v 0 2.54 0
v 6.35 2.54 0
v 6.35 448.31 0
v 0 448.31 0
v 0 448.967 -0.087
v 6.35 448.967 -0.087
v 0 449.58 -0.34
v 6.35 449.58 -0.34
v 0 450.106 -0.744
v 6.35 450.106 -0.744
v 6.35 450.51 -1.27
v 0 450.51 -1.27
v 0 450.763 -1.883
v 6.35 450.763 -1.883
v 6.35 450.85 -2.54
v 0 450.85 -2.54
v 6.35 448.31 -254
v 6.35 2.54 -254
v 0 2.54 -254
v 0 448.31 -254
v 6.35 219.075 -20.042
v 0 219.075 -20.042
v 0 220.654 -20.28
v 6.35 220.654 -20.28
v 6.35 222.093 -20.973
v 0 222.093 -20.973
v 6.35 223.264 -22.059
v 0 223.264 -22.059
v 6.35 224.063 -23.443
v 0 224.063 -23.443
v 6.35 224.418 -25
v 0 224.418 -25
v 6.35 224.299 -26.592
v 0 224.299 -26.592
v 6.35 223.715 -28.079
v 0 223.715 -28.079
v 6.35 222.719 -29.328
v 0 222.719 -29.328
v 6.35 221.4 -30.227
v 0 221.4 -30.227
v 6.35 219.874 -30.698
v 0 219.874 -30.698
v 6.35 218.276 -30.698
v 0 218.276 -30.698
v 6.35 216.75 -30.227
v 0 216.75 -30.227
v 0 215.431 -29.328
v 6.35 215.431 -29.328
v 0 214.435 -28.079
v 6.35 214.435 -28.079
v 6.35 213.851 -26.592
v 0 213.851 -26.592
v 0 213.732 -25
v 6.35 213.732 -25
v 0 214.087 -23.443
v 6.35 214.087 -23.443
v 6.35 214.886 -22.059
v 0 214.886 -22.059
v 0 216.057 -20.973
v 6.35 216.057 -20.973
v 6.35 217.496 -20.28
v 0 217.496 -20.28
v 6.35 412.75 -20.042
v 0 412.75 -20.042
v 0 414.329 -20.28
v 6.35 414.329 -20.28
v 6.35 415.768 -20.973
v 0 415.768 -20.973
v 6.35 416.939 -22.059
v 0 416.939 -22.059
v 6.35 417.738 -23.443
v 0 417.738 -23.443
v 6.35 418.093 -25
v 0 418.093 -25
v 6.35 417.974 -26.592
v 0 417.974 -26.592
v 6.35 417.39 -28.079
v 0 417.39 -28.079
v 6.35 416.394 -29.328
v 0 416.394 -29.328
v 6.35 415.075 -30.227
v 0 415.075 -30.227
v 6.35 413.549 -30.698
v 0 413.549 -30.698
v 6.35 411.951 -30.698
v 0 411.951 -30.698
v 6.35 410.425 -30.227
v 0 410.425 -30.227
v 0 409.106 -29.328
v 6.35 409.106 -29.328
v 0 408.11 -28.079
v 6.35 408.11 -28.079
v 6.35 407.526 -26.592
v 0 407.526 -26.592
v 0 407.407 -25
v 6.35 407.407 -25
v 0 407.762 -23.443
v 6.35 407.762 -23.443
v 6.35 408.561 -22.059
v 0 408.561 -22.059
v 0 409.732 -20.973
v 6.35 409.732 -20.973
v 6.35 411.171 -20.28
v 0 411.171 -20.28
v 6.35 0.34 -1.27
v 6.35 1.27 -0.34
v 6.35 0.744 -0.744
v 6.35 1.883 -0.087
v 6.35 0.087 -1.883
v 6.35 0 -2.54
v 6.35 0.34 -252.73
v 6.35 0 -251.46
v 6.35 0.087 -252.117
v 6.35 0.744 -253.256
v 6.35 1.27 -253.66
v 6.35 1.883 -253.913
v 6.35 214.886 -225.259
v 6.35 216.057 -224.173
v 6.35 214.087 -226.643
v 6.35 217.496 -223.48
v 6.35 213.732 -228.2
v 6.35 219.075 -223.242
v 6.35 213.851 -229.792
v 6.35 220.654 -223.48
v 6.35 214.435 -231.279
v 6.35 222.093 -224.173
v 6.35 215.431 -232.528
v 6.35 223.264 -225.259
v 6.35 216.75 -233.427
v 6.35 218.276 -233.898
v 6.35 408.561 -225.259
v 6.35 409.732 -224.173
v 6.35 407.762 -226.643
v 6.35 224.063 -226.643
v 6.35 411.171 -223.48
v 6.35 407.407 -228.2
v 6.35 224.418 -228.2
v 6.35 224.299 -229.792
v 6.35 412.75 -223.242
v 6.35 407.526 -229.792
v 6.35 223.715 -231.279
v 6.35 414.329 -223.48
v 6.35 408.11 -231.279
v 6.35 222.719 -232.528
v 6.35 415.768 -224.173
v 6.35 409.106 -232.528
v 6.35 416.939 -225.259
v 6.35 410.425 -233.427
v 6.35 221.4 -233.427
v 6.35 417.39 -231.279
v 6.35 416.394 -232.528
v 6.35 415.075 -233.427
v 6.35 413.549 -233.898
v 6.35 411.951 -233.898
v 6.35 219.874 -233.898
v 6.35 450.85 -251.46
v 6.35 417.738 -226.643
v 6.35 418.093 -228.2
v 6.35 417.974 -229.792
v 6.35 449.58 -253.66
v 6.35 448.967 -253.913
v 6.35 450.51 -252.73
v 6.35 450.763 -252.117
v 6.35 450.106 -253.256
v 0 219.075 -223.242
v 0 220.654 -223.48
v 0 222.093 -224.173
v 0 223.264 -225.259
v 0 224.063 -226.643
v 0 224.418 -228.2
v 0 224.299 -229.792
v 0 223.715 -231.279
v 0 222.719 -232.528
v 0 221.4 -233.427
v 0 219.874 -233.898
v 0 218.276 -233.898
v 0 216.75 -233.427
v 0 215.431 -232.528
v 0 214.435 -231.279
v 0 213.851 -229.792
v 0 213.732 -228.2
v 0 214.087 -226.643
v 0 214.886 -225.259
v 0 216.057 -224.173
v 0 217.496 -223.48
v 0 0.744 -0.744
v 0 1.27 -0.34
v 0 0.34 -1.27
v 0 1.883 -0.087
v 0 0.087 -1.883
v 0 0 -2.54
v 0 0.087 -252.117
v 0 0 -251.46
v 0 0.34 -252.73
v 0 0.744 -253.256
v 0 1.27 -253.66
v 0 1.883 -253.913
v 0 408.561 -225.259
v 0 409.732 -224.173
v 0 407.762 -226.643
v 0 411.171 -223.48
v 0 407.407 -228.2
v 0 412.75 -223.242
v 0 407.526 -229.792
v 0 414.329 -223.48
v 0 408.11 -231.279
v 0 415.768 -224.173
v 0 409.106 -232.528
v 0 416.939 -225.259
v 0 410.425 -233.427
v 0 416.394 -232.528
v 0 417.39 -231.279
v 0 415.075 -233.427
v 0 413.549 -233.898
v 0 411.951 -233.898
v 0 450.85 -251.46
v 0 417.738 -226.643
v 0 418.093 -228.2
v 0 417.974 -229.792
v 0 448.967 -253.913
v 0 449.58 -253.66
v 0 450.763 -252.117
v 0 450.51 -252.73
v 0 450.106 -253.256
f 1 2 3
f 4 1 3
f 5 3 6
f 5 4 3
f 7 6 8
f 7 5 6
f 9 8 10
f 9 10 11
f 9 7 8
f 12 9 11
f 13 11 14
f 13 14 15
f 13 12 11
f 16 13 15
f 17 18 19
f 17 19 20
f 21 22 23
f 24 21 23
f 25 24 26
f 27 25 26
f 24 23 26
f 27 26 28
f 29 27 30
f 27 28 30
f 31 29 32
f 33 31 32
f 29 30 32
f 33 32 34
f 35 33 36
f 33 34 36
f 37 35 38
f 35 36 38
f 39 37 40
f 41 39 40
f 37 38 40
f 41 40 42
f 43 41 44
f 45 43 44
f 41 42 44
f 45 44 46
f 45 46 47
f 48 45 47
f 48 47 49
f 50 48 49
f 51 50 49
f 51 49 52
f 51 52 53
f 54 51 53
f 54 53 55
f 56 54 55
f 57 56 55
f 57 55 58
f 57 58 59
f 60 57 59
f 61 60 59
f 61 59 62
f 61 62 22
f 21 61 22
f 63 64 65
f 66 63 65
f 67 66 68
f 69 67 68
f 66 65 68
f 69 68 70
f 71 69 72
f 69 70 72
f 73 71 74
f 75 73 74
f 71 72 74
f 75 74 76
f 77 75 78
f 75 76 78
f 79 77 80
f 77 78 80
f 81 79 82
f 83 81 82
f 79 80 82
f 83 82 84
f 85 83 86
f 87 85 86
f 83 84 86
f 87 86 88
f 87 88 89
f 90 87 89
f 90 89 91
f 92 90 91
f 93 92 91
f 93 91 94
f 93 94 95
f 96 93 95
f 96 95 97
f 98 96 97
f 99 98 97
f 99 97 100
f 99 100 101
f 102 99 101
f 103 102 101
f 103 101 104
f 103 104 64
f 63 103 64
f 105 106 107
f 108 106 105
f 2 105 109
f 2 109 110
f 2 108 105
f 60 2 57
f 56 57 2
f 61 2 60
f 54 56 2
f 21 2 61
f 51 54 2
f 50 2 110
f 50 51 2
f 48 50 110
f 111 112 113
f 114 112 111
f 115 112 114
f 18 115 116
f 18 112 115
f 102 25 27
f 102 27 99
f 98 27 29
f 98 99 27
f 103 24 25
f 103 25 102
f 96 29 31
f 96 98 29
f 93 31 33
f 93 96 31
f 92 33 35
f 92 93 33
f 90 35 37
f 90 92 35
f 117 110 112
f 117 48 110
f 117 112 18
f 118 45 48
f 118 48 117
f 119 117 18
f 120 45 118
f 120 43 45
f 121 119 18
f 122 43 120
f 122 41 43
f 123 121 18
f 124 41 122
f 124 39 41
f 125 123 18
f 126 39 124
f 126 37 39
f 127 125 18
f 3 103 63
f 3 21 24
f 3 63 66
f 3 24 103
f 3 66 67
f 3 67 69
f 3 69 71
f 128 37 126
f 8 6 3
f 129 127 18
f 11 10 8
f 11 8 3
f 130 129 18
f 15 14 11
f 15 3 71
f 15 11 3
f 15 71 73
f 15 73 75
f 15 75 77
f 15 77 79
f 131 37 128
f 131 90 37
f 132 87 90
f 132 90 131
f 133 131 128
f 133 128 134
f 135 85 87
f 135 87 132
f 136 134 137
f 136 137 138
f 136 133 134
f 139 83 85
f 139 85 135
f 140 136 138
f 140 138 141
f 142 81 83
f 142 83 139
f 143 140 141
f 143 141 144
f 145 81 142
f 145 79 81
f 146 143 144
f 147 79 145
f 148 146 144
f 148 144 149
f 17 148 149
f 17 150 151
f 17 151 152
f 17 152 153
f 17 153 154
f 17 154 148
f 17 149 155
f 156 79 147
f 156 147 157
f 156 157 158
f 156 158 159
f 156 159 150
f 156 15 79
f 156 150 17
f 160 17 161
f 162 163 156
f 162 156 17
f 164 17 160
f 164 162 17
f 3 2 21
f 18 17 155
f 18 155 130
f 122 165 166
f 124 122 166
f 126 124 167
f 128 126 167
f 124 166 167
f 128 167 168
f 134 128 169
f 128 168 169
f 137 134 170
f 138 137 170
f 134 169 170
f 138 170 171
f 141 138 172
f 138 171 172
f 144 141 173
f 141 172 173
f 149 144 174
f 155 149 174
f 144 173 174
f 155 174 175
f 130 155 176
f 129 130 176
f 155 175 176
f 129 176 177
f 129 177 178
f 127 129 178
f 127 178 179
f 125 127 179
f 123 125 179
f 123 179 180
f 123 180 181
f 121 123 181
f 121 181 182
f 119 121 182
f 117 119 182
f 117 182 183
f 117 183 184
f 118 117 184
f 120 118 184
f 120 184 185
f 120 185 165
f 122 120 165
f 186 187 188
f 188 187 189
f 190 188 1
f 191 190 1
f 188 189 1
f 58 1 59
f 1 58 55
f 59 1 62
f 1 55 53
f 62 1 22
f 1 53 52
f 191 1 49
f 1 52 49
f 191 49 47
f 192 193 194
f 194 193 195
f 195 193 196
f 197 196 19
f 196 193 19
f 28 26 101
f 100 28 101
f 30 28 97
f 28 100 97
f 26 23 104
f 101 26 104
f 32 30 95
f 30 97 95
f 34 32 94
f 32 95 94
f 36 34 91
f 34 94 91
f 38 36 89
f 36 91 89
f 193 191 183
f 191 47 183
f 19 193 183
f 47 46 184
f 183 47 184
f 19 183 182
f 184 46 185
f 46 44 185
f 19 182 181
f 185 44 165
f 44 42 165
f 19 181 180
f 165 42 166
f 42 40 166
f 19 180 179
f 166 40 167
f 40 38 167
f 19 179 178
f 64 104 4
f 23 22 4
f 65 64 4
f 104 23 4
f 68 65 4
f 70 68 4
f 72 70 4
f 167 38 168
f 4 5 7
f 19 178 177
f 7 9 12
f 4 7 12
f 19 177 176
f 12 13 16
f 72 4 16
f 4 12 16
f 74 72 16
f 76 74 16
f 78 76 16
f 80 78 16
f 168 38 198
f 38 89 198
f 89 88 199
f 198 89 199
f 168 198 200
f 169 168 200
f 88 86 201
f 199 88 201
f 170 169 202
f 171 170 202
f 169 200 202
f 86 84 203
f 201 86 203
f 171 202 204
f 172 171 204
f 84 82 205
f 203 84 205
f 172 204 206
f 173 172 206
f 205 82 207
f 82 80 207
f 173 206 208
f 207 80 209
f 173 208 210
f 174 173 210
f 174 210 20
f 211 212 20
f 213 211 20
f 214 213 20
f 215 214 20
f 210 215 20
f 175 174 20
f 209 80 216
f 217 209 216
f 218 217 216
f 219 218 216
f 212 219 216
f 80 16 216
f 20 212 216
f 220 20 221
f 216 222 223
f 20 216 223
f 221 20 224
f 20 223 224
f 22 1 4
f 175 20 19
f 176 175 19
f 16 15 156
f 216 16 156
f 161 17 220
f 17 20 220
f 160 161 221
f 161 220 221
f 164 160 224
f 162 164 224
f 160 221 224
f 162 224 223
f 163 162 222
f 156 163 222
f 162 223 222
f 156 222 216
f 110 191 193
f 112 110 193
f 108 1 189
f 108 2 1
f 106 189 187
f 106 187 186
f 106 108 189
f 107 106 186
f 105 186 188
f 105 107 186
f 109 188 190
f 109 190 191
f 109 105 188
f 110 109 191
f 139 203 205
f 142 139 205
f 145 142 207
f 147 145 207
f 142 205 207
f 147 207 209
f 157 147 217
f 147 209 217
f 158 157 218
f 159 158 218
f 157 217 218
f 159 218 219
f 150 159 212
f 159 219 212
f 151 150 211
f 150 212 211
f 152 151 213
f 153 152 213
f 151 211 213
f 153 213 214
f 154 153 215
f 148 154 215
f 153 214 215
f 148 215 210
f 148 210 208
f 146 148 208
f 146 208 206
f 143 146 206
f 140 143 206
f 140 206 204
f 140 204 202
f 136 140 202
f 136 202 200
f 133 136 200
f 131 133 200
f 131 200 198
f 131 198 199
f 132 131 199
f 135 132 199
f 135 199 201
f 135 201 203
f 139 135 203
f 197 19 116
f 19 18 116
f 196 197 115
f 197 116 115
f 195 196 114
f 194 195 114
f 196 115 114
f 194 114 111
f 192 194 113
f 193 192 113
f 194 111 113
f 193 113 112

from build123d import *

# Parameters (mm, degrees)
SKETCH1_W                        = 254
SKETCH1_H                        = 438.15
BOSS_EXTRUDE1_DEPTH              = 6.35
F_27_64_0_42188_DIAMETER_HOLE1_D = 10.715752
SKETCH4_W                        = 254
SKETCH4_H                        = 12.7
BOSS_EXTRUDE2_DEPTH              = 6.35
FILLET1_R                        = 2.54


with BuildPart() as part:
    # Sketch1 → Boss-Extrude1 (new body)
    with BuildSketch(Plane(origin=(0, 0, 0), x_dir=(0, 0, -1), z_dir=(1, 0, 0))):
        with Locations((127, 219.075)):
            Rectangle(SKETCH1_W, SKETCH1_H)
    extrude(amount=BOSS_EXTRUDE1_DEPTH)

    # 27/64 (0.42188) Diameter Hole1 (through all)
    with Locations(Plane(origin=(6.35, 0, 0), x_dir=(0, 0, -1), z_dir=(1, 0, 0))):
        with Locations((25.4, 412.75), (25.4, 219.075), (228.6, 219.075), (228.6, 412.75)):
            Hole(F_27_64_0_42188_DIAMETER_HOLE1_D / 2)

    # Sketch4 → Boss-Extrude2 (add)
    with BuildSketch(Plane(origin=(6.35, 0, 0), x_dir=(0, 0, -1), z_dir=(1, 0, 0))):
        with Locations((127, 444.5)):
            Rectangle(SKETCH4_W, SKETCH4_H)
    extrude(amount=-BOSS_EXTRUDE2_DEPTH)

    # Fillet1
    fillet1_edges = [part.edges().sort_by_distance(p)[0] for p in [
        (3.175, 450.85, -254),
        (3.175, 450.85, 0),
        (3.175, 0, -254),
        (3.175, 0, 0),
    ]]
    fillet(fillet1_edges, radius=FILLET1_R)


solid = part.part
